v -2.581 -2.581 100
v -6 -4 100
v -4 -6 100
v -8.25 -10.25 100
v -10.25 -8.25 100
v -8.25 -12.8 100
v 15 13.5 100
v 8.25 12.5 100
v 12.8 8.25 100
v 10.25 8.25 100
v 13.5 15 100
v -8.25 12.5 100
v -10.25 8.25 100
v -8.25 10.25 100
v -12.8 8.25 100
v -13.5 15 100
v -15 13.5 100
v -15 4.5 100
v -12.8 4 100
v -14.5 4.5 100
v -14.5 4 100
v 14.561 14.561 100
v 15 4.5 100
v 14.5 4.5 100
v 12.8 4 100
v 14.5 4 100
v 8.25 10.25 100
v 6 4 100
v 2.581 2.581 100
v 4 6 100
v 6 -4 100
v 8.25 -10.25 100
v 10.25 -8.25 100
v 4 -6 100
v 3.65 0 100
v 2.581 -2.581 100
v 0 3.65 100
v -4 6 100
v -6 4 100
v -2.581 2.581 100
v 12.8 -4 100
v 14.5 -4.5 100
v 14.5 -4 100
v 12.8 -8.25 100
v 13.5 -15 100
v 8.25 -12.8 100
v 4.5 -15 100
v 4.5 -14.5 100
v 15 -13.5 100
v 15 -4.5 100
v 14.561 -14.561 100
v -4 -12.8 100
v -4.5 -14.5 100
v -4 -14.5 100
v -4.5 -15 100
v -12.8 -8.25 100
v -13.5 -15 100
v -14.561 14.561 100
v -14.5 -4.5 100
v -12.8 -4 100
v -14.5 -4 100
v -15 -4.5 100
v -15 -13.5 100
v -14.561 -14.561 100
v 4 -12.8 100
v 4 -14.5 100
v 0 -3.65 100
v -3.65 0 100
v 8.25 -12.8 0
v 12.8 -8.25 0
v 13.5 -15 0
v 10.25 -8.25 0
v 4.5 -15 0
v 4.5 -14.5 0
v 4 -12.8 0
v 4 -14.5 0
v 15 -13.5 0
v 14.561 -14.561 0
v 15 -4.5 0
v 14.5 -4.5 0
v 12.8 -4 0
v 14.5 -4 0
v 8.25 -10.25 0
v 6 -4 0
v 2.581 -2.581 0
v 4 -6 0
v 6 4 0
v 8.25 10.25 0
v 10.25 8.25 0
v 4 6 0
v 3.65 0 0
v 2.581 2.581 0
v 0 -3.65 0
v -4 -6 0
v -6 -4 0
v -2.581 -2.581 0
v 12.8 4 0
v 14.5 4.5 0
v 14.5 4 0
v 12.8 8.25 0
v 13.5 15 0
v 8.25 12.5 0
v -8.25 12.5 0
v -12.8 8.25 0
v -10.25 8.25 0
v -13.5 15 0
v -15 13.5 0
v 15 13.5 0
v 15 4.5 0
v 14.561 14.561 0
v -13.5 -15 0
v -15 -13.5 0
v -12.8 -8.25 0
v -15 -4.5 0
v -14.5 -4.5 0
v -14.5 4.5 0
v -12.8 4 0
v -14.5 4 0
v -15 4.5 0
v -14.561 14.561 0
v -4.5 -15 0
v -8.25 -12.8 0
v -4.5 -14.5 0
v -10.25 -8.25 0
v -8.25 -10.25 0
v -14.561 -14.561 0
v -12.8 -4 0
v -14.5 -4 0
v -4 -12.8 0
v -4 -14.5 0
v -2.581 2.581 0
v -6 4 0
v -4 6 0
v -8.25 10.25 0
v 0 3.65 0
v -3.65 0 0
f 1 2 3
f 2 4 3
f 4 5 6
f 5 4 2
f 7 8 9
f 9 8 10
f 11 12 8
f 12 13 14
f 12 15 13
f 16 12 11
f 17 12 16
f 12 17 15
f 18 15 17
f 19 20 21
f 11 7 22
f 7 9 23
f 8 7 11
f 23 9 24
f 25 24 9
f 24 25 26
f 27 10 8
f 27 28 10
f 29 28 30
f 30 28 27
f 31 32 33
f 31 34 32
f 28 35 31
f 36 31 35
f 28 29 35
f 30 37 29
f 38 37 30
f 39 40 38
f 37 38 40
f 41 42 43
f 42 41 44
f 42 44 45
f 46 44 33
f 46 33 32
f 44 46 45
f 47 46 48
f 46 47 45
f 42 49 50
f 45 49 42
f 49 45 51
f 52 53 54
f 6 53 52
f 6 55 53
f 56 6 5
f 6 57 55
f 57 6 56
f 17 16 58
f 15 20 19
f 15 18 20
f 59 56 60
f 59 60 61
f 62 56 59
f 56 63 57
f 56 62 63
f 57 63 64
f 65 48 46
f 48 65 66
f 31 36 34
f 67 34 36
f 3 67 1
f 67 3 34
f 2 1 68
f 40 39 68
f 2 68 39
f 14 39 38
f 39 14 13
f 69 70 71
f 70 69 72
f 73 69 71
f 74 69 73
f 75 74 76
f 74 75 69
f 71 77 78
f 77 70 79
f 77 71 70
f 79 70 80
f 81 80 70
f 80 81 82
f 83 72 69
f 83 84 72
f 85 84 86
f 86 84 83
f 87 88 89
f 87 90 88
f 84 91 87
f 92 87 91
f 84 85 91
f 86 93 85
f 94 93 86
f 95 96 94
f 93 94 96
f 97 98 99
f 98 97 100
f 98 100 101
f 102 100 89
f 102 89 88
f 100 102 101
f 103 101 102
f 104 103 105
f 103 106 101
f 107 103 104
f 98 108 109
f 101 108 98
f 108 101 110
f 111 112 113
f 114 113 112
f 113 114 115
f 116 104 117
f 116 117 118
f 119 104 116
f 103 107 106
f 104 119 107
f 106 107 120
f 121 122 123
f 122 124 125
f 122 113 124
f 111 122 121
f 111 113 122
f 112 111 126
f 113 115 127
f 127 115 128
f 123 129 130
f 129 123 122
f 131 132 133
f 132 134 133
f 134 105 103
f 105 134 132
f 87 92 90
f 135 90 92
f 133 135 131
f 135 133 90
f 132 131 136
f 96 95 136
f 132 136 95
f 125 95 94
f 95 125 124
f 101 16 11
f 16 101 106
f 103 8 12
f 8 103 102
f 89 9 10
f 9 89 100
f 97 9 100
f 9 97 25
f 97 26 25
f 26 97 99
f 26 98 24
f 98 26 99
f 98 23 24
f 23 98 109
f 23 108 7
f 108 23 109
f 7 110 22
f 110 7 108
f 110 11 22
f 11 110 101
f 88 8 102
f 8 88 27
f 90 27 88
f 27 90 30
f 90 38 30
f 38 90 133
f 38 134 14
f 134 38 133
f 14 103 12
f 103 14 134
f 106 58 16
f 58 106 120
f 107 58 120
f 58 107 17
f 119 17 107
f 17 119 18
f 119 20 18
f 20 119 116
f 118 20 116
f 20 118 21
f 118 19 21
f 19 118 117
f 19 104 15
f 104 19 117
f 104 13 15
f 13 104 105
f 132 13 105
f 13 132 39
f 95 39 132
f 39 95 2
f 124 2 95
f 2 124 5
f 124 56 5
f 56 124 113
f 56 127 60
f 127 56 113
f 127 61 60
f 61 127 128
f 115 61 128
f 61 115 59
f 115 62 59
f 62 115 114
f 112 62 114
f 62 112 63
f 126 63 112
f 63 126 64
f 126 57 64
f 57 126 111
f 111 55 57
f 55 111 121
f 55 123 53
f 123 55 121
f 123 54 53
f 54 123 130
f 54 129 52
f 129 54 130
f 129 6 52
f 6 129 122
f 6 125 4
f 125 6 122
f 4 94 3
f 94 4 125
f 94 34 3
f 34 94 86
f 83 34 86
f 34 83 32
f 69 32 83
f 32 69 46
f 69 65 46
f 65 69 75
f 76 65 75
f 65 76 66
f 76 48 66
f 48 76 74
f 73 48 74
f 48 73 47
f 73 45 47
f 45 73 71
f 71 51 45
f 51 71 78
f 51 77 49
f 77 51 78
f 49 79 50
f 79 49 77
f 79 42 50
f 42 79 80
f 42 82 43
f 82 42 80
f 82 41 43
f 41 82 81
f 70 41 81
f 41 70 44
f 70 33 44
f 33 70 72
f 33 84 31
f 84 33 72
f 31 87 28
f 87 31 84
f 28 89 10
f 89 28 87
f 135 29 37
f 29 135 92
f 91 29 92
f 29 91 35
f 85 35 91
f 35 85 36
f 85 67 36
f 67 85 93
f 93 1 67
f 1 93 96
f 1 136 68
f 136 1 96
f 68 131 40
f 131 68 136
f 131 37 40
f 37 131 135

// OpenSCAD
// Aleksandr Saechnikov 09 june 2015
ALU_profile_3N(height=100, size=30);

module ALU_profile_3N(size=30, height=10, radius=1.5, step=0.5) {

	linear_extrude(height=height) {
		union() {
			sub_extrusion_profile(size, radius, step);
			rotate([0,0,90])  sub_extrusion_profile(size, radius, step);
			rotate([0,0,180]) sub_extrusion_profile(size, radius, step);
			rotate([0,0,270]) sub_extrusion_profile(size, radius, step);
		}
	}
    difference() {
        translate([0, 0, height/2])
            cube([size-radius*2, size, height], center=true);

        translate([0, -2.5, height/2])
            cube([size, size, height], center=true);
        }
    
    module sub_extrusion_profile(size=30, radius = 1.5, step=0.5) {

        reSize = size/30; // Scalling

        k0 = 0;
        k2 = 3.65*reSize;
        k1 = k2*cos(45);

        k3 = 4*reSize;
        k4 = 6*reSize;
        k5 = 8.25*reSize; k5_2 = k5 + k4 - k3;
        k6 = 12.8*reSize;
        k7 = 15*reSize;

        _radius = radius;// OR  *reSize -- Corner radius
        _step = step;    // OR  *reSize -- Step size

        polygon(points=[
            [k1,k1],[0,k2], // Center hole
            [0,k4],[k3,k4],[k5,k5_2],[k5,k6],[k3,k6],
            [k3,k7-_step],[k3+_step,k7-_step],[k3+_step,k7], //Step
            [k7-_radius,k7],[k7-_radius*(1.-cos(45)),k7-_radius*(1.-cos(45))],[k7,k7-_radius],// Corner
            [k7,k3+_step],[k7-_step,k3+_step],[k7-_step,k3], // Step
            [k6,k3],[k6,k5],[k5_2,k5],[k4,k3],[k4,0],
            [k2,0]  // Center hole
        ]);
    }
}
